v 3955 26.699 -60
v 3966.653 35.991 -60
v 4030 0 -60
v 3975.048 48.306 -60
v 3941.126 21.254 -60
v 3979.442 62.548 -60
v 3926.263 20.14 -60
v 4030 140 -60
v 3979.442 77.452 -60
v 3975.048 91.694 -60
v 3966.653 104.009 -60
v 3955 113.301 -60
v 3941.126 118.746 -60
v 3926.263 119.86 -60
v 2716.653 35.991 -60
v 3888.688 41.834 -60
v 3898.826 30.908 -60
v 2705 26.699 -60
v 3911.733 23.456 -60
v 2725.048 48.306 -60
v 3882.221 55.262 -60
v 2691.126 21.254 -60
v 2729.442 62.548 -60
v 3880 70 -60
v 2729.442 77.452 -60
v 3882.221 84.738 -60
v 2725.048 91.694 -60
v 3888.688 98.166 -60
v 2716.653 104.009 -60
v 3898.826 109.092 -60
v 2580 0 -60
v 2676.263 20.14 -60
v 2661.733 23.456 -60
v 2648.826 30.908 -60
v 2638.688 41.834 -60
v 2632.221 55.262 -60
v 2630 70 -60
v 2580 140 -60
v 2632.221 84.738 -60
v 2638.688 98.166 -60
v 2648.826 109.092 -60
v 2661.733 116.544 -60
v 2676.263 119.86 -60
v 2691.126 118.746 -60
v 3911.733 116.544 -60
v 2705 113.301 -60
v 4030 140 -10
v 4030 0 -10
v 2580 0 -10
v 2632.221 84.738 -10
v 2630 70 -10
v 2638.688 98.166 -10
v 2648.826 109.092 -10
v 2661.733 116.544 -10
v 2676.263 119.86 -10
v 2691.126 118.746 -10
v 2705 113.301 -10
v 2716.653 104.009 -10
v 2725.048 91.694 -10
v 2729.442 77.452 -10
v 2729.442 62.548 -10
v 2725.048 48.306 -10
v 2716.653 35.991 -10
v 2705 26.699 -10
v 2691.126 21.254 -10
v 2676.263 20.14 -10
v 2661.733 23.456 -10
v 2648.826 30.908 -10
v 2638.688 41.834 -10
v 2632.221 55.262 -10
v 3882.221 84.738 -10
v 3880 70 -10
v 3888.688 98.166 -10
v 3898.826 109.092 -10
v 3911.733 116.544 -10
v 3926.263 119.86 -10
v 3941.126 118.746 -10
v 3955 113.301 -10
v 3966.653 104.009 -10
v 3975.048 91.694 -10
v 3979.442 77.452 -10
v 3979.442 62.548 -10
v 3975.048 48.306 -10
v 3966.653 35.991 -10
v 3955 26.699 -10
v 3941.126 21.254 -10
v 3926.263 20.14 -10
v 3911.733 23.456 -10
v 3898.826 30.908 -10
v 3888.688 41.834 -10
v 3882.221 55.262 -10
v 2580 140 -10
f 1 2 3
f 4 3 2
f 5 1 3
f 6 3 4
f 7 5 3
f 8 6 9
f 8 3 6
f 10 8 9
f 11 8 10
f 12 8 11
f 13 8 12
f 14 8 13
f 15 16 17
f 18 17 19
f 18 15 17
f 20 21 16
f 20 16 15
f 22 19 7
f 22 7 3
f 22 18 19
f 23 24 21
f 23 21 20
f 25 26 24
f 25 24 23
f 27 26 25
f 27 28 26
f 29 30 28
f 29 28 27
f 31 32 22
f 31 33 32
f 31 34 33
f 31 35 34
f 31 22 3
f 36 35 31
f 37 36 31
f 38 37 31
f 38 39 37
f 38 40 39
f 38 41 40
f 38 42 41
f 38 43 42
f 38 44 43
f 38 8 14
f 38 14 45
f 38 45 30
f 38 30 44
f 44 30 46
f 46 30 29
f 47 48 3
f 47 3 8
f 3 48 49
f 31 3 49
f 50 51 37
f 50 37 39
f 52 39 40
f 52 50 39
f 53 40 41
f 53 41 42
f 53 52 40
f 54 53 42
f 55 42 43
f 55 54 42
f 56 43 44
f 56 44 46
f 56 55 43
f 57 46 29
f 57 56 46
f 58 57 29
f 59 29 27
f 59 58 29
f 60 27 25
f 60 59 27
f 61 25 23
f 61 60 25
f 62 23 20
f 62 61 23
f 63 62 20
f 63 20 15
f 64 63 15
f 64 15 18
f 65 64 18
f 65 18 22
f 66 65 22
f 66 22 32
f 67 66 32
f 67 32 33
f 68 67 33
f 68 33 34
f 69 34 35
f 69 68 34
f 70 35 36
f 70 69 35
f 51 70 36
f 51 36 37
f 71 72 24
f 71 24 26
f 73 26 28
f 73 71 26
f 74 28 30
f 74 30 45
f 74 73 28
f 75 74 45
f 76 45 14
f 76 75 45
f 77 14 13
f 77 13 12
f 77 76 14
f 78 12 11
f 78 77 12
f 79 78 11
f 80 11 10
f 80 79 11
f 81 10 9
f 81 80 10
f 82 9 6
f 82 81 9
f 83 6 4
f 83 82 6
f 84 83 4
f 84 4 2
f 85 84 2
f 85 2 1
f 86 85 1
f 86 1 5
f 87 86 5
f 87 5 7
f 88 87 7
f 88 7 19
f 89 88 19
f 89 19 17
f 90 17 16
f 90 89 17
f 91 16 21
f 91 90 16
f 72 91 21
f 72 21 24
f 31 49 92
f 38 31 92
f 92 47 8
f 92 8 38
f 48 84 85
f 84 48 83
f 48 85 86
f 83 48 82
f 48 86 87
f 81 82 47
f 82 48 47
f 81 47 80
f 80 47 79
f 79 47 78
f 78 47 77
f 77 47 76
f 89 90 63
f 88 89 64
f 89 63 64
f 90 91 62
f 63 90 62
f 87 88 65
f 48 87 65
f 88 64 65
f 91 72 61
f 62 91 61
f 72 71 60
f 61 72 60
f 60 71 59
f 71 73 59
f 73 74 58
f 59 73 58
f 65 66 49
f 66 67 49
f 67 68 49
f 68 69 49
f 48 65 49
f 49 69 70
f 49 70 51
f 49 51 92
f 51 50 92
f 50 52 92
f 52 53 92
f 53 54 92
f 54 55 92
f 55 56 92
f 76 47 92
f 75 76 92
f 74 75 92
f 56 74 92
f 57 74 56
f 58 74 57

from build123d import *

# Parameters (mm, degrees)
SKETCH1_W           = 3930
SKETCH1_H           = 140
BOSS_EXTRUDE1_DEPTH = 50
SKETCH2_R           = 50
CUT_EXTRUDE1_DEPTH  = 50
SKETCH3_W           = 100
SKETCH3_H           = 140
BOSS_EXTRUDE2_DEPTH = 50
SKETCH4_R           = 50
CUT_EXTRUDE2_DEPTH  = 51
SKETCH5_W           = 1450
SKETCH5_H           = 140
SKETCH5_R           = 50
BOSS_EXTRUDE3_DEPTH = 50
SKETCH6_W           = 4130
SKETCH6_H           = 140
CUT_EXTRUDE3_DEPTH  = 50


with BuildPart() as part:
    # Sketch1 → Boss-Extrude1 (new body)
    with BuildSketch(Plane.XY):
        with Locations((1965, 70)):
            Rectangle(SKETCH1_W, SKETCH1_H)
    extrude(amount=BOSS_EXTRUDE1_DEPTH)

    # Sketch2 → Cut-Extrude1 (cut)
    with BuildSketch(Plane.XY.offset(50)):
        with Locations((3930, 70)):
            Circle(SKETCH2_R)
        with Locations((0, 70)):
            Circle(SKETCH2_R)
    extrude(amount=-CUT_EXTRUDE1_DEPTH, mode=Mode.SUBTRACT)

    # Sketch3 → Boss-Extrude2 (add, through all)
    with BuildSketch(Plane(origin=(0, 0, 0), x_dir=(-1, 0, 0), z_dir=(0, 0, -1))):
        with Locations((-3980, 70)):
            Rectangle(SKETCH3_W, SKETCH3_H)
        with Locations((50, 70)):
            Rectangle(SKETCH3_W, SKETCH3_H)
    extrude(amount=-BOSS_EXTRUDE2_DEPTH)

    # Sketch4 → Cut-Extrude2 (cut, through all)
    with BuildSketch(Plane(origin=(0, 0, 0), x_dir=(-1, 0, 0), z_dir=(0, 0, -1))):
        with Locations((0, 70)):
            Circle(SKETCH4_R)
        with Locations((-3930, 70)):
            Circle(SKETCH4_R)
    extrude(amount=-CUT_EXTRUDE2_DEPTH, mode=Mode.SUBTRACT)

    # Sketch6 → Cut-Extrude3 (cut)
    with BuildSketch(Plane.XY.offset(50)):
        with Locations((1965, 70)):
            Rectangle(SKETCH6_W, SKETCH6_H)
    extrude(amount=-CUT_EXTRUDE3_DEPTH, mode=Mode.SUBTRACT)


with BuildPart() as body_2:
    # Sketch5 → Boss-Extrude3 (new body)
    with BuildSketch(Plane(origin=(0, 0, -10), x_dir=(-1, 0, 0), z_dir=(0, 0, -1))):
        with Locations((-3305, 70)):
            Rectangle(SKETCH5_W, SKETCH5_H)
        with Locations((-3930, 70)):
            Circle(SKETCH5_R, mode=Mode.SUBTRACT)
        with Locations((-2680, 70)):
            Circle(SKETCH5_R, mode=Mode.SUBTRACT)
    extrude(amount=BOSS_EXTRUDE3_DEPTH)


solid = body_2.part
